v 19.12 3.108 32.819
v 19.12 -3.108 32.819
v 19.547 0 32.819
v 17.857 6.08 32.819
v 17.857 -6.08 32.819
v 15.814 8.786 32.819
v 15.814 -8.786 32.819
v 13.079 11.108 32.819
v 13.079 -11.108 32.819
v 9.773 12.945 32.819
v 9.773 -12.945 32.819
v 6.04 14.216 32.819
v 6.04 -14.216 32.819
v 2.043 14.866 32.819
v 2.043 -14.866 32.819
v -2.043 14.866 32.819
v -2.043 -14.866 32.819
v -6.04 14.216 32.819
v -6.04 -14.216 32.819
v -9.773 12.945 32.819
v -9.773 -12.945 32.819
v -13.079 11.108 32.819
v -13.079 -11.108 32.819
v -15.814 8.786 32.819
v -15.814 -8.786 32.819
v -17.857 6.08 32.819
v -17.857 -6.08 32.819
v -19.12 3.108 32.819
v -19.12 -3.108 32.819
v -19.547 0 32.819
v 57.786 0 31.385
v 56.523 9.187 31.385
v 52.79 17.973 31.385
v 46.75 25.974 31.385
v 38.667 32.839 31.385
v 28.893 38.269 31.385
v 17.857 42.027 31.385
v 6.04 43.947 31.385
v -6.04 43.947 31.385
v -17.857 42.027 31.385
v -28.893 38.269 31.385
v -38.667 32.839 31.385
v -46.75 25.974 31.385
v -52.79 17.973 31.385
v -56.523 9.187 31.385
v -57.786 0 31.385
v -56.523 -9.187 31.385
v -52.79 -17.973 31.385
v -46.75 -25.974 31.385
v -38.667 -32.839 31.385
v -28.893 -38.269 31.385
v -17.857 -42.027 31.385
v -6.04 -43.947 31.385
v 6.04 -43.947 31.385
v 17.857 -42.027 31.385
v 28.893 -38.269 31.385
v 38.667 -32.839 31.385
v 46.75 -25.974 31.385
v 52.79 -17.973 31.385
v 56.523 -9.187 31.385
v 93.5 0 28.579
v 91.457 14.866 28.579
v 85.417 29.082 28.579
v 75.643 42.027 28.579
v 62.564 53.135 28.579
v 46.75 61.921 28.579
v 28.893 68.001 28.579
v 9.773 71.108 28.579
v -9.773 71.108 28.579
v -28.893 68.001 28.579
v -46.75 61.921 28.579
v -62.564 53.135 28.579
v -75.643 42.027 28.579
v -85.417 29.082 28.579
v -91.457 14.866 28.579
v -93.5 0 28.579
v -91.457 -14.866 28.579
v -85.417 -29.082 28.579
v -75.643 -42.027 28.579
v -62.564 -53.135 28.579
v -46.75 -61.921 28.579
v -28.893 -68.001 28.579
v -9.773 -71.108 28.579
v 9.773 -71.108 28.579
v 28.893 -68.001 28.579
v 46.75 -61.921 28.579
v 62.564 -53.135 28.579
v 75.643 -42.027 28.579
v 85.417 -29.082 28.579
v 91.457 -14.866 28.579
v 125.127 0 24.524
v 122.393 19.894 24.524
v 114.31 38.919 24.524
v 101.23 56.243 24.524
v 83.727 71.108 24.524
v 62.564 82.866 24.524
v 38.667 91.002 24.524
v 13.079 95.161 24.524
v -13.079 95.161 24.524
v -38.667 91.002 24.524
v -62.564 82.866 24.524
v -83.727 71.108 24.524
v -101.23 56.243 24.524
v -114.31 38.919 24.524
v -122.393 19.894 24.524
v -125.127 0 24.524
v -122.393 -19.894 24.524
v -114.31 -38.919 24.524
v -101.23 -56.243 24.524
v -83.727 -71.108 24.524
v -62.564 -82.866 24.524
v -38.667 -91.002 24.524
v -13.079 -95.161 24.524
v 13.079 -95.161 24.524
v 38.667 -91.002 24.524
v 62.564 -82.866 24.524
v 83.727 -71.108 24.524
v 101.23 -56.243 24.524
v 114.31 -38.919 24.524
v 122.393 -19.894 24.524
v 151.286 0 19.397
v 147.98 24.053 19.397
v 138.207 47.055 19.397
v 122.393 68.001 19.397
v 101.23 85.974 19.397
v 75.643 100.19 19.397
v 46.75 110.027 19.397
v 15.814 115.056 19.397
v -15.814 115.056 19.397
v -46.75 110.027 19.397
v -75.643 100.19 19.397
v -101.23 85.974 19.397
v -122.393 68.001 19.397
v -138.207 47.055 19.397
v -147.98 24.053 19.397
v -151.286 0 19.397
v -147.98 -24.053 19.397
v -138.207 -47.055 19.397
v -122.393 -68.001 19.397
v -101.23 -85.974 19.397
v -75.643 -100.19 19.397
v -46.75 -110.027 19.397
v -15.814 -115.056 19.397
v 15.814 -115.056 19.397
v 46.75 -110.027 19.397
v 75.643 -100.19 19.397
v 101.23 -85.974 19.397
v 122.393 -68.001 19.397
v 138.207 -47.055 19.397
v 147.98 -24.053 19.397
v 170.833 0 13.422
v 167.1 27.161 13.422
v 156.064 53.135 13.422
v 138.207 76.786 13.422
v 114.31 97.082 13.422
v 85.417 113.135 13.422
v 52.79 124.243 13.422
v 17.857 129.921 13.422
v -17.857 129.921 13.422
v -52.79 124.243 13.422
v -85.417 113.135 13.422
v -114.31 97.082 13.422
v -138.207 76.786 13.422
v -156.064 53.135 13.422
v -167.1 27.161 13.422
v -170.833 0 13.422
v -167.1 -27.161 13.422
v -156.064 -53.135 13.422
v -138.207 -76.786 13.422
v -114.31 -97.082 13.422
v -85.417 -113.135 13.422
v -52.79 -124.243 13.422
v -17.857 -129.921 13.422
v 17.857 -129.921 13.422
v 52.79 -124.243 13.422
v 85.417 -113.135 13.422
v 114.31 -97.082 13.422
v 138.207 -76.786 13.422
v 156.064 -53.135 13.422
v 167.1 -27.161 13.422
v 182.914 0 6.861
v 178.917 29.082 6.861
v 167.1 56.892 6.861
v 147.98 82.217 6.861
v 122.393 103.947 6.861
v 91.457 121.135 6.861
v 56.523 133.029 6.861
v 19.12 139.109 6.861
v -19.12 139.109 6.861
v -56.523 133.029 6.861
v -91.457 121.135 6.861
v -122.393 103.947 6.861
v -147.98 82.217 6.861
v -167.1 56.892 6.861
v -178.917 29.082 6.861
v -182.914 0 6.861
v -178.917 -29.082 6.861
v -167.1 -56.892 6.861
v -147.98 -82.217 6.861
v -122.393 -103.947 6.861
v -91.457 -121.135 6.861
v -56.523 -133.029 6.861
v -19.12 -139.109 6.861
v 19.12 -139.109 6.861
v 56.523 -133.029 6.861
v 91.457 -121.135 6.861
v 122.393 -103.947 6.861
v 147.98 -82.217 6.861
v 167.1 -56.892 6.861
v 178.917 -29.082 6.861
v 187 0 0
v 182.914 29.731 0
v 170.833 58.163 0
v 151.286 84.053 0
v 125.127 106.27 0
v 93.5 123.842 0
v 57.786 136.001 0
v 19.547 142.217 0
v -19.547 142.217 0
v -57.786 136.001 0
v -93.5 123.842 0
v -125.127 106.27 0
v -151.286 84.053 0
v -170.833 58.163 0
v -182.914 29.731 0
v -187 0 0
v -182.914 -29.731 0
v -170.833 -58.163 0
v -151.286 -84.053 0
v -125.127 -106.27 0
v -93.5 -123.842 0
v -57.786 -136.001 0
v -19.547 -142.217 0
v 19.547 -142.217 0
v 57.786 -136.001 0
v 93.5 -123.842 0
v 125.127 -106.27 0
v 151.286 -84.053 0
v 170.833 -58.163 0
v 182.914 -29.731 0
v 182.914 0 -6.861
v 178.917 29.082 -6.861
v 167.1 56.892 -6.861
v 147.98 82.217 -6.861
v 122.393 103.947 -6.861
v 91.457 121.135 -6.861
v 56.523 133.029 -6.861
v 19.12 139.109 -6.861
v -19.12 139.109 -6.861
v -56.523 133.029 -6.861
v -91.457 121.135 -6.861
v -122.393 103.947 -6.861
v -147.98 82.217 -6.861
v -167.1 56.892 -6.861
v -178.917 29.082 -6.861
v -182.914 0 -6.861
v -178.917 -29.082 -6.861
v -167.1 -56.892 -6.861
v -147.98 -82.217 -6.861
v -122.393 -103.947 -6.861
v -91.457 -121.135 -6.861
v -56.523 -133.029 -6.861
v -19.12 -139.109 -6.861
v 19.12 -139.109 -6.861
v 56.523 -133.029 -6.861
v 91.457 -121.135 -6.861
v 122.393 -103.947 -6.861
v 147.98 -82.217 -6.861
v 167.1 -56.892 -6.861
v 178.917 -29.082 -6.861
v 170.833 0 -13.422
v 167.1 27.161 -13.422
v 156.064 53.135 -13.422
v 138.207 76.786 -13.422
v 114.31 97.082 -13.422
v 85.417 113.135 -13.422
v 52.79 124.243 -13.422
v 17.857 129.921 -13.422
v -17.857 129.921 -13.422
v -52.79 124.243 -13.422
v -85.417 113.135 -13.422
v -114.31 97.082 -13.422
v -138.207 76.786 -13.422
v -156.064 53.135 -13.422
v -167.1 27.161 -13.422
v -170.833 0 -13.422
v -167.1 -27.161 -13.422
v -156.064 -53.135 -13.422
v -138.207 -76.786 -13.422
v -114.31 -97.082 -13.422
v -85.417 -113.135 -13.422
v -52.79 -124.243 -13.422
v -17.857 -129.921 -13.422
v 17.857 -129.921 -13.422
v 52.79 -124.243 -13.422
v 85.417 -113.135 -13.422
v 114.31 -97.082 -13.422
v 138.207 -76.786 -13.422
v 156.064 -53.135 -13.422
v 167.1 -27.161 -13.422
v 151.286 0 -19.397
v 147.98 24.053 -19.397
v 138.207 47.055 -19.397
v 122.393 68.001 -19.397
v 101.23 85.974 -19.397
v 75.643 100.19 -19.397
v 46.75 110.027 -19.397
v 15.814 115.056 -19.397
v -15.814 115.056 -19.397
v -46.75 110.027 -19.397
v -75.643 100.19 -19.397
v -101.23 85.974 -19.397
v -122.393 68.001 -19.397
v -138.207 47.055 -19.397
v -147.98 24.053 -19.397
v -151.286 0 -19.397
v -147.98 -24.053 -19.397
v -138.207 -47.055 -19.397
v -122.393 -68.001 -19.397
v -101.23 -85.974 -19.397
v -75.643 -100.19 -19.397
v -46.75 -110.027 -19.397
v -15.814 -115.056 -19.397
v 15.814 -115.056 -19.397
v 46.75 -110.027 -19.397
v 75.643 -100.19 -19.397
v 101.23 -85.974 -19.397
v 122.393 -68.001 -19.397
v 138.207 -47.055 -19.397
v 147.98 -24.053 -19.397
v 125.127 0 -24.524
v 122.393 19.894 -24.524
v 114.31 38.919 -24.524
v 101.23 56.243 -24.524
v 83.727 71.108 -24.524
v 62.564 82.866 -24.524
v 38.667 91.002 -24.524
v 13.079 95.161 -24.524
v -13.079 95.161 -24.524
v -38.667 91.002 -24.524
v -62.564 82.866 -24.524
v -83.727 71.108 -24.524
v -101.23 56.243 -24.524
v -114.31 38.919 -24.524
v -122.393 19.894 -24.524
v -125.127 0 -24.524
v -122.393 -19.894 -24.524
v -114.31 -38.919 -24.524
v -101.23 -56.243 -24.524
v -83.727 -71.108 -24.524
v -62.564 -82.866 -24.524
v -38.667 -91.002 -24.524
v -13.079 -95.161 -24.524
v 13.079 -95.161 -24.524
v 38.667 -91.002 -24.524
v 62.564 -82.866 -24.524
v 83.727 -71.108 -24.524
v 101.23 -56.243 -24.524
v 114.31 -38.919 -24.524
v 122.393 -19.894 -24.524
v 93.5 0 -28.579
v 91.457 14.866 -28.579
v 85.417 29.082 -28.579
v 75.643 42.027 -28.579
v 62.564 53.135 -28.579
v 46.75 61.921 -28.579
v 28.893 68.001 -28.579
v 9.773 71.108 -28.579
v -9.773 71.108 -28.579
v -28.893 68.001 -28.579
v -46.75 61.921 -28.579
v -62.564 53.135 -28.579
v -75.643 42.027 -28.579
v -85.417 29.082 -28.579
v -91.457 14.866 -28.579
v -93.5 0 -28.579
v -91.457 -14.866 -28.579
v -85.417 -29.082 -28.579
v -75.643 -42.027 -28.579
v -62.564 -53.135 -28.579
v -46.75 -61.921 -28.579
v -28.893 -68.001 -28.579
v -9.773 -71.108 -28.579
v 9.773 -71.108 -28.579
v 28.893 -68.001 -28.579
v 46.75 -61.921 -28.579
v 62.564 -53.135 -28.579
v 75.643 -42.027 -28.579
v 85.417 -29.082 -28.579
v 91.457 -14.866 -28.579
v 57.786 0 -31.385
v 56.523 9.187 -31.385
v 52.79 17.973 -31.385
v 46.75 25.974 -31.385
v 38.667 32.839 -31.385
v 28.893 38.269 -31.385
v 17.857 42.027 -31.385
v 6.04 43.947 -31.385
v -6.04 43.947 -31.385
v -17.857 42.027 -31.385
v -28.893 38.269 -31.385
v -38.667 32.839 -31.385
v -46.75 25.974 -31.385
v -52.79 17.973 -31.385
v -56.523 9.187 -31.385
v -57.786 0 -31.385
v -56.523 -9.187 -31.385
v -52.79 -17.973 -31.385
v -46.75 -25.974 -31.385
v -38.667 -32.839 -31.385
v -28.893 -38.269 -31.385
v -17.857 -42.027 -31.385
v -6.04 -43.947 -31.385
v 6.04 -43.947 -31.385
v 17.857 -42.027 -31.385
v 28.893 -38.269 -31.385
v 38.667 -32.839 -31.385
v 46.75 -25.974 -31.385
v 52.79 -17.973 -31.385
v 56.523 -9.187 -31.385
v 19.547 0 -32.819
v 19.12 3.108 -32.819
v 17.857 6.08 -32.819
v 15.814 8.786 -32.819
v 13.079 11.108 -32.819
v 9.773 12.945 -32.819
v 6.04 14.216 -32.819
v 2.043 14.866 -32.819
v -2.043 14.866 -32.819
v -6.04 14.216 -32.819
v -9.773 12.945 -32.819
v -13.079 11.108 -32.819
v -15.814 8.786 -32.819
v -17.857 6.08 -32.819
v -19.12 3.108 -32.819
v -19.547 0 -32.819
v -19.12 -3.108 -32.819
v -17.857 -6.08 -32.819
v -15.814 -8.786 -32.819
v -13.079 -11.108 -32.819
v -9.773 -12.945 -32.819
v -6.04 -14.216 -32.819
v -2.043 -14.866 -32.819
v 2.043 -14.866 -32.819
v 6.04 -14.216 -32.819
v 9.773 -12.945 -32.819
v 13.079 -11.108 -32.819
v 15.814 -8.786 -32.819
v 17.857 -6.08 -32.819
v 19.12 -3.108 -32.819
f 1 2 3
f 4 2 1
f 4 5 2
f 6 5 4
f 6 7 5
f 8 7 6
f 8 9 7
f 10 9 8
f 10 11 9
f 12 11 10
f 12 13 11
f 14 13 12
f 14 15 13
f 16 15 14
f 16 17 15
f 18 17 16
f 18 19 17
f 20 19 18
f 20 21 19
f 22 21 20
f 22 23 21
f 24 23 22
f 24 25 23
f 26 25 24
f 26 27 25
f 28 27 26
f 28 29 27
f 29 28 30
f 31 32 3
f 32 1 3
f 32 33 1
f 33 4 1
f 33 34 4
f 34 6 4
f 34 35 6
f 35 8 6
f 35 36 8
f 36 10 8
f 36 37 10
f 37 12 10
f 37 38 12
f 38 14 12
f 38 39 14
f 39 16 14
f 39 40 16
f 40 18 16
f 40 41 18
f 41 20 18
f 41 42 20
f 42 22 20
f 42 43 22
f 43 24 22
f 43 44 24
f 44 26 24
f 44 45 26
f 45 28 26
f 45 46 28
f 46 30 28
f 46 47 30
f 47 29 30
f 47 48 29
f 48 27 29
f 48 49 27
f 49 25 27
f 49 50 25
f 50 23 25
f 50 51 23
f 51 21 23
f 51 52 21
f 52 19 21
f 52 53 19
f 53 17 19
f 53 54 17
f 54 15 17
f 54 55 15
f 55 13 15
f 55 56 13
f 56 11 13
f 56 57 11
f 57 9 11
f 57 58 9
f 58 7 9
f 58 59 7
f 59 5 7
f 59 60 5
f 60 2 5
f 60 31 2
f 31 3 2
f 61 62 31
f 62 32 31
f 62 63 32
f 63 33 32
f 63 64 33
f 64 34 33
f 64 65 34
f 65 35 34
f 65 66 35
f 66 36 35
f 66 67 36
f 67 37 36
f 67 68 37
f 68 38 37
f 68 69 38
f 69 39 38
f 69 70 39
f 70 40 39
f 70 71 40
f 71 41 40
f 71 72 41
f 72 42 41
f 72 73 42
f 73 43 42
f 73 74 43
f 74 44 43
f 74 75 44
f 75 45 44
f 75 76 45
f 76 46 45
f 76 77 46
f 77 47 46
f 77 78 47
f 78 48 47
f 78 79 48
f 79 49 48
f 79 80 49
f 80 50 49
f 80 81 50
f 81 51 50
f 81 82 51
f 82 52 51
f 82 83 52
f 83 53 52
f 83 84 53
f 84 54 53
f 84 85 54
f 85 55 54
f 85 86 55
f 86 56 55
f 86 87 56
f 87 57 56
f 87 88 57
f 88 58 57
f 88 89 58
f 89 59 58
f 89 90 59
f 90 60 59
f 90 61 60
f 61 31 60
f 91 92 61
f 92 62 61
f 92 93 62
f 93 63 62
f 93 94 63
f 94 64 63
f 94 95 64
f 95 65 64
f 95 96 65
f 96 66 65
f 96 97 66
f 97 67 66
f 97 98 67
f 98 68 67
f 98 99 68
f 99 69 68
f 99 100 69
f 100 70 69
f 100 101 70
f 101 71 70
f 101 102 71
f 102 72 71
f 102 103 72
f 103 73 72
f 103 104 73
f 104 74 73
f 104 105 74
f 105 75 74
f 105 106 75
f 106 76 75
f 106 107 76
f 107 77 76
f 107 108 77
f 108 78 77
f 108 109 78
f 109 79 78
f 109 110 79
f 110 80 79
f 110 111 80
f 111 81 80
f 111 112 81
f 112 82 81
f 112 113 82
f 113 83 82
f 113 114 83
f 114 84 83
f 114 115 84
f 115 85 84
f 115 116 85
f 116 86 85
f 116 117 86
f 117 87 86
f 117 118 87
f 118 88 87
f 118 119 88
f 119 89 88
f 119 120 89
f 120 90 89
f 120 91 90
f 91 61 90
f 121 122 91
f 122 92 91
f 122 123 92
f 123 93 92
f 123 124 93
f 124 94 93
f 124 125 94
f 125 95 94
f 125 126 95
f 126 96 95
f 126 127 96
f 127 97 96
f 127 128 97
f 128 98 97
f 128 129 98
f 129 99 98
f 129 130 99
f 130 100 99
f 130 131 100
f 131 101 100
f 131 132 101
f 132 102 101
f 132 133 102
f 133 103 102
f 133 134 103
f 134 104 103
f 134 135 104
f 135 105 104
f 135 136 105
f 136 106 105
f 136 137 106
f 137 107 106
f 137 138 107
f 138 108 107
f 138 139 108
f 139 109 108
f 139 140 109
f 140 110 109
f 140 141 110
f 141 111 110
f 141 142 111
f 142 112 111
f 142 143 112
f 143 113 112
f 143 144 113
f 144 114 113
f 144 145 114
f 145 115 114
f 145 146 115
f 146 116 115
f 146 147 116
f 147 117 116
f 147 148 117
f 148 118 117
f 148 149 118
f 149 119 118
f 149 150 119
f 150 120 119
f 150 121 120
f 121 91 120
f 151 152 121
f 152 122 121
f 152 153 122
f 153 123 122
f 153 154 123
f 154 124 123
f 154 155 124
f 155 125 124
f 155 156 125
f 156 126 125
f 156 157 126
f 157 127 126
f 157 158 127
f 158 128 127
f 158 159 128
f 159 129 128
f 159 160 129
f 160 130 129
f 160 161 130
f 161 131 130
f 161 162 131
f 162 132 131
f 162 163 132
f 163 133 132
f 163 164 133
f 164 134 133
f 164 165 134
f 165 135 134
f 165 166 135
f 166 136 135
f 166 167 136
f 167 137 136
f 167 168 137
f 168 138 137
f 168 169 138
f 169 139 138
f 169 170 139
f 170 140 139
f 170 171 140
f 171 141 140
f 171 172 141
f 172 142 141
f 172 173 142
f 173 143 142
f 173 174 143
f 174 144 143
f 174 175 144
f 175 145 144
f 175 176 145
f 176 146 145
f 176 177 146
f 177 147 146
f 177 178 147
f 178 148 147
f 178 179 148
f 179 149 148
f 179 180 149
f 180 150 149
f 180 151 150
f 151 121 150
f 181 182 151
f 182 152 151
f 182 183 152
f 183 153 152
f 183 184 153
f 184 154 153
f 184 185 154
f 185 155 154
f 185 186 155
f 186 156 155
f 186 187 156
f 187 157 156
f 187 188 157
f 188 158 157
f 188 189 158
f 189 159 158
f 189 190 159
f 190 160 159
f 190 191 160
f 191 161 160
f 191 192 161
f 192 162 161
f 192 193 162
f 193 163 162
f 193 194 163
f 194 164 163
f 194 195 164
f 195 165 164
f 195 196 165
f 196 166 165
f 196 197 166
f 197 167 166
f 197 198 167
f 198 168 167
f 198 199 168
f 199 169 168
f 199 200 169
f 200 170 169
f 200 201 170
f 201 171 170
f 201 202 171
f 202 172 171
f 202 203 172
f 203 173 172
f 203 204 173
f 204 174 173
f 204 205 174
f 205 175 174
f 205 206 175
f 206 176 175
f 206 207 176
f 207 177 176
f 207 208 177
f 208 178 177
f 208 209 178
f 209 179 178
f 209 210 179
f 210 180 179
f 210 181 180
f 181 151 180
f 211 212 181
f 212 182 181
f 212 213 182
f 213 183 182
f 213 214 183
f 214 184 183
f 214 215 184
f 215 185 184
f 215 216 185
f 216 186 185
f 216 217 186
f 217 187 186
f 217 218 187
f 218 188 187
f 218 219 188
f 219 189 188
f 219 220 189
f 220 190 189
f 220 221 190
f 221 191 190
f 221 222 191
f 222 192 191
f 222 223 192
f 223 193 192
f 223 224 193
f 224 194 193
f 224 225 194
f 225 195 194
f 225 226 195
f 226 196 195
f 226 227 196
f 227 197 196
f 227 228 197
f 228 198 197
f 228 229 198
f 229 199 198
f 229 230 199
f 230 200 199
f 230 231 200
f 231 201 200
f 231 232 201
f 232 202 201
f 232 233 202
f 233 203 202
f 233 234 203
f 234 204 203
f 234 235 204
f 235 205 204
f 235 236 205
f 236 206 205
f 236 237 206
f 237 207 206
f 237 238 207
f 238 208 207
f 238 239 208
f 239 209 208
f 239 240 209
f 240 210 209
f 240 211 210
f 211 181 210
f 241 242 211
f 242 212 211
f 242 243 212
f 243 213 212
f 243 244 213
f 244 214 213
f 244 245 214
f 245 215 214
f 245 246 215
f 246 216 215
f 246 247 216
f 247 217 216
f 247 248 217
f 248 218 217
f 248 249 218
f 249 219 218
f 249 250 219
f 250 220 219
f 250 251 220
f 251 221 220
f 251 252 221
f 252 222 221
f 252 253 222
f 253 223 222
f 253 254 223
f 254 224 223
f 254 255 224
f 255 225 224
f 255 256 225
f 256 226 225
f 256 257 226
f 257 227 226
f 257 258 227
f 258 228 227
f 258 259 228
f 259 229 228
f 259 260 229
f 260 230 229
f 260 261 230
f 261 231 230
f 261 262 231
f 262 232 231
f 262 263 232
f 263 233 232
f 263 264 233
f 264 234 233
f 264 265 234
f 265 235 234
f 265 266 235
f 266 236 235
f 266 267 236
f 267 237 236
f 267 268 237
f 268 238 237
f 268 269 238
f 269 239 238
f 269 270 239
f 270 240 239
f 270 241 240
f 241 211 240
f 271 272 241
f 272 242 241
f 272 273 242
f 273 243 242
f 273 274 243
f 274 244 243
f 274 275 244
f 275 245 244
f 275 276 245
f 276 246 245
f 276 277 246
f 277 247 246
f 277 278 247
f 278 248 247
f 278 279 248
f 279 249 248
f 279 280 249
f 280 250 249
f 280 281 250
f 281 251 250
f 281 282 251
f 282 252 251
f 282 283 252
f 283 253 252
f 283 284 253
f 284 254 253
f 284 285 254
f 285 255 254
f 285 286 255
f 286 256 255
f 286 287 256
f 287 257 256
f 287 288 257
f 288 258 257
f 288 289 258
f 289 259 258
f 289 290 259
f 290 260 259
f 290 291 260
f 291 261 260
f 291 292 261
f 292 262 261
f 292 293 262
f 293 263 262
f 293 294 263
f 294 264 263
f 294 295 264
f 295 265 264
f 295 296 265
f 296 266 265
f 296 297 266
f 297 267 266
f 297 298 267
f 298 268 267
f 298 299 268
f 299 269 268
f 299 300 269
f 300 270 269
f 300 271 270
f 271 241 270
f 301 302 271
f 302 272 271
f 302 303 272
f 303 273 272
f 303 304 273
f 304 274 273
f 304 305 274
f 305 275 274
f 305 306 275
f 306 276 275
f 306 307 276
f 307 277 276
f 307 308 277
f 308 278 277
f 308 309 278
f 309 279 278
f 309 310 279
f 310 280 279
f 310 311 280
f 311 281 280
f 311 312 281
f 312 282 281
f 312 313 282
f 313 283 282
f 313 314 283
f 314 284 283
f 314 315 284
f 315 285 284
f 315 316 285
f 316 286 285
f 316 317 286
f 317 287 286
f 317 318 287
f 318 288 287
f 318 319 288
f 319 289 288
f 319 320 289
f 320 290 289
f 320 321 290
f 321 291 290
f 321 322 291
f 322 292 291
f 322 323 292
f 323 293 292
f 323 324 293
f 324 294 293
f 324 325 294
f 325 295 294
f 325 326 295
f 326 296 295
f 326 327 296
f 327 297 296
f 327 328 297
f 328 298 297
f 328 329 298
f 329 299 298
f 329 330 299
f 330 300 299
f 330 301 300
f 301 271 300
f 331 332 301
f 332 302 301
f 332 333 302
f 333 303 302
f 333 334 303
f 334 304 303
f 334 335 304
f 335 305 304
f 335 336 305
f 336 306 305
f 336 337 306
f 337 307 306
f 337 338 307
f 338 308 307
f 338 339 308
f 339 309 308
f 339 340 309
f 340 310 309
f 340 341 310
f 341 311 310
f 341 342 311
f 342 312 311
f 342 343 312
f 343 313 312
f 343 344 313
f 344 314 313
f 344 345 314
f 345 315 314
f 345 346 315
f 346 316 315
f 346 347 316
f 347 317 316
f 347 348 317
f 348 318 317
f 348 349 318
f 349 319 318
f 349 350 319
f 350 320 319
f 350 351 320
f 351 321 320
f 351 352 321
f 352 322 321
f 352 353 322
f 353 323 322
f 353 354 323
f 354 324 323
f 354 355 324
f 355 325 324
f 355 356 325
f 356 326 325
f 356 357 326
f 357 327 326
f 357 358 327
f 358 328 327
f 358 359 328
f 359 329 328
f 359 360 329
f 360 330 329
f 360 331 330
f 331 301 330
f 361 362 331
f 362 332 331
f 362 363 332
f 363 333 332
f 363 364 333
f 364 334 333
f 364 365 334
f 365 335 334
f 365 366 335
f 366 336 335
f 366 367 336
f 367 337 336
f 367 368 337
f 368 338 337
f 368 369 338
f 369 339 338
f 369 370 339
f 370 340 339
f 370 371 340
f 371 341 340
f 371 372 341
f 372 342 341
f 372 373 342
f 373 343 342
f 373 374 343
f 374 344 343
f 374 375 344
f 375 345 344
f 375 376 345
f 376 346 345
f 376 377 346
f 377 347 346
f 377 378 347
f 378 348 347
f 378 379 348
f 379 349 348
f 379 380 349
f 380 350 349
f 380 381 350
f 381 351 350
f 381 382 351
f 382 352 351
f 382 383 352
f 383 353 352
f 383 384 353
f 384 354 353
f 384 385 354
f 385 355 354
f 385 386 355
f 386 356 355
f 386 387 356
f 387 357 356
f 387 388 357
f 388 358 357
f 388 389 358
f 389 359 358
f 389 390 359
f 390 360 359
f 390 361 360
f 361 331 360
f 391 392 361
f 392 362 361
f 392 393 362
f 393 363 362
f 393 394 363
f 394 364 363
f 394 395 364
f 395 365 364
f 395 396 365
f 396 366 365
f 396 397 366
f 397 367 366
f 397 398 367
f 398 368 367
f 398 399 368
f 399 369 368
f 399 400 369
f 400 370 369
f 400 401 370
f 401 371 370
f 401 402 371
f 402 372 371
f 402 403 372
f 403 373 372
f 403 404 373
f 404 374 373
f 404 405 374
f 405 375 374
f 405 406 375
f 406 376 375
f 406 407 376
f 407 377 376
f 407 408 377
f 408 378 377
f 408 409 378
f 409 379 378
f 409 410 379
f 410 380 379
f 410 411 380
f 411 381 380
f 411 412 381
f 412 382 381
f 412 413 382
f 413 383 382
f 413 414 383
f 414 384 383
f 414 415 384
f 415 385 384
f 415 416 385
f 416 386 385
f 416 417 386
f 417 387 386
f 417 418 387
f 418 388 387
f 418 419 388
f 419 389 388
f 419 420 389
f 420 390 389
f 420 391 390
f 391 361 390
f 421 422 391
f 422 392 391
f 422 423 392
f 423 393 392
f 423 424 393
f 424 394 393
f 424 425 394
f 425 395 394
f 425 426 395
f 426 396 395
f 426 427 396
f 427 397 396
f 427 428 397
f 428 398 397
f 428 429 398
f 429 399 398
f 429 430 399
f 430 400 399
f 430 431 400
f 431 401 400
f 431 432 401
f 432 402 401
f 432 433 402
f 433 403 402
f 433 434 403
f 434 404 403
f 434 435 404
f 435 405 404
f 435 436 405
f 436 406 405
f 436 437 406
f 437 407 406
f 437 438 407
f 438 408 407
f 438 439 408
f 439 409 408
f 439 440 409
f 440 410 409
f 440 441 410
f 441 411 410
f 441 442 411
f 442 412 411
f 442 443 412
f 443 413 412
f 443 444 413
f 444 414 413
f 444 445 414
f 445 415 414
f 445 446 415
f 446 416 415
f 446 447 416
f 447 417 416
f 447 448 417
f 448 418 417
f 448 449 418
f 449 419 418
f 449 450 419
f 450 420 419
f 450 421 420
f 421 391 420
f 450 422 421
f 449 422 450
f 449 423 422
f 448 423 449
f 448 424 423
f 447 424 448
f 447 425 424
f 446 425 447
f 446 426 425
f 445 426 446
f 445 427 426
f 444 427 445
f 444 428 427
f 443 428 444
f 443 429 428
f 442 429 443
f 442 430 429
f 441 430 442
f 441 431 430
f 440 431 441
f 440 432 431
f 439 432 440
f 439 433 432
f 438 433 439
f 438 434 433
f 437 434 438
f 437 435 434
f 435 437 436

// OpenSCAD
// Generated by SolidPython 1.0.1 on 2020-07-29 00:46:53


scale(v = [17, 13, 3]) {
	sphere(r = 11);
}
/***********************************************
*********      SolidPython code:      **********
************************************************
 
# import packages: SolidPython
from solid import *
from solid.utils import *
from itertools import chain, combinations, permutations


class Resize:

    def __init__(self, scad_file):
        self.scad_file = scad_file
        #self.scad_file = import_scad(scad_file)
        # cone/cylinder param:
        self.r1 = 0
        self.r2 = 0
        self.h = 0
        # rectangular prism param:
        self.w = 0
        self.l = 0
        # ellipse param:
        self.r = 0

    # import OpenScad code (file name corresponds to shape)


    # classify shape + parameters
    def assign(self, param1, param2, param3):
        if self.scad_file == 'cone.scad':
            self.r1 = param1
            self.r2 = param2
            self.h = param3
        elif self.scad_file == 'cylinder.scad':
            self.r1 = param1
            self.r2 = param2
            self.h = param3
        elif self.scad_file == 'rectangularPrism.scad':
            self.h = param1
            self.l = param2
            self.w = param3
        else:
            self.r = param1
            self.h = param2

    # resize parameters
    def iterate(self):
        x = range(3, 20, 2)
        i = 1
        if self.scad_file == 'cone.scad':
            tempList = list(permutations(x, 2))
            for temp in tempList:
                param1 = temp[0]
                param2 = temp[1]
                filepath = 'produced_scad_files/' + 'cone' + str(param1) + '_' + str(param2) + '_' + '.scad'
                scad_render_to_file(cylinder(h=param1, r1=param2, r2=0), filepath)

        elif self.scad_file == 'cylinder.scad':
            tempList = list(permutations(x, 3))
            for temp in tempList:
                param1 = temp[0]
                param2 = temp[1]
                filepath = 'produced_scad_files/' + 'cylinder' + str(param1) + '_' + str(param2) + '_' + '.scad'
                scad_render_to_file(cylinder(h=param1, r1=param2, r2=param2), filepath)

        elif self.scad_file == 'rectangularPrism.scad':
            tempList = list(permutations(x, 3))
            for temp in tempList:
                param1 = temp[0]
                param2 = temp[1]
                param3 = temp[2]
                filepath = 'produced_scad_files/' + 'rectangularPrism' + str(param1) + '_' + str(param2) + '_' + str(
                    param3) + '.scad'
                scad_render_to_file(cube(size=(param1, param2, param3)), filepath)

        elif self.scad_file == 'ellipse.scad':
            tempList = list(permutations(x, 4))
            for temp in tempList:
                param1 = temp[0]
                param2 = temp[1]
                param3 = temp[2]
                param4 = temp[3]
                filepath = 'produced_scad_files/' + 'ellipse' + str(param1) + '_' + str(param2) + '_' + str(param3) + '_' + str(param4) + '.scad'
                scad_render_to_file(scale([param1, param2, param3])(sphere(r=param4)), filepath)

    def render_to_scadfile(self):
        scad_render_to_file(scad, 'example.scad') 
 
************************************************/
